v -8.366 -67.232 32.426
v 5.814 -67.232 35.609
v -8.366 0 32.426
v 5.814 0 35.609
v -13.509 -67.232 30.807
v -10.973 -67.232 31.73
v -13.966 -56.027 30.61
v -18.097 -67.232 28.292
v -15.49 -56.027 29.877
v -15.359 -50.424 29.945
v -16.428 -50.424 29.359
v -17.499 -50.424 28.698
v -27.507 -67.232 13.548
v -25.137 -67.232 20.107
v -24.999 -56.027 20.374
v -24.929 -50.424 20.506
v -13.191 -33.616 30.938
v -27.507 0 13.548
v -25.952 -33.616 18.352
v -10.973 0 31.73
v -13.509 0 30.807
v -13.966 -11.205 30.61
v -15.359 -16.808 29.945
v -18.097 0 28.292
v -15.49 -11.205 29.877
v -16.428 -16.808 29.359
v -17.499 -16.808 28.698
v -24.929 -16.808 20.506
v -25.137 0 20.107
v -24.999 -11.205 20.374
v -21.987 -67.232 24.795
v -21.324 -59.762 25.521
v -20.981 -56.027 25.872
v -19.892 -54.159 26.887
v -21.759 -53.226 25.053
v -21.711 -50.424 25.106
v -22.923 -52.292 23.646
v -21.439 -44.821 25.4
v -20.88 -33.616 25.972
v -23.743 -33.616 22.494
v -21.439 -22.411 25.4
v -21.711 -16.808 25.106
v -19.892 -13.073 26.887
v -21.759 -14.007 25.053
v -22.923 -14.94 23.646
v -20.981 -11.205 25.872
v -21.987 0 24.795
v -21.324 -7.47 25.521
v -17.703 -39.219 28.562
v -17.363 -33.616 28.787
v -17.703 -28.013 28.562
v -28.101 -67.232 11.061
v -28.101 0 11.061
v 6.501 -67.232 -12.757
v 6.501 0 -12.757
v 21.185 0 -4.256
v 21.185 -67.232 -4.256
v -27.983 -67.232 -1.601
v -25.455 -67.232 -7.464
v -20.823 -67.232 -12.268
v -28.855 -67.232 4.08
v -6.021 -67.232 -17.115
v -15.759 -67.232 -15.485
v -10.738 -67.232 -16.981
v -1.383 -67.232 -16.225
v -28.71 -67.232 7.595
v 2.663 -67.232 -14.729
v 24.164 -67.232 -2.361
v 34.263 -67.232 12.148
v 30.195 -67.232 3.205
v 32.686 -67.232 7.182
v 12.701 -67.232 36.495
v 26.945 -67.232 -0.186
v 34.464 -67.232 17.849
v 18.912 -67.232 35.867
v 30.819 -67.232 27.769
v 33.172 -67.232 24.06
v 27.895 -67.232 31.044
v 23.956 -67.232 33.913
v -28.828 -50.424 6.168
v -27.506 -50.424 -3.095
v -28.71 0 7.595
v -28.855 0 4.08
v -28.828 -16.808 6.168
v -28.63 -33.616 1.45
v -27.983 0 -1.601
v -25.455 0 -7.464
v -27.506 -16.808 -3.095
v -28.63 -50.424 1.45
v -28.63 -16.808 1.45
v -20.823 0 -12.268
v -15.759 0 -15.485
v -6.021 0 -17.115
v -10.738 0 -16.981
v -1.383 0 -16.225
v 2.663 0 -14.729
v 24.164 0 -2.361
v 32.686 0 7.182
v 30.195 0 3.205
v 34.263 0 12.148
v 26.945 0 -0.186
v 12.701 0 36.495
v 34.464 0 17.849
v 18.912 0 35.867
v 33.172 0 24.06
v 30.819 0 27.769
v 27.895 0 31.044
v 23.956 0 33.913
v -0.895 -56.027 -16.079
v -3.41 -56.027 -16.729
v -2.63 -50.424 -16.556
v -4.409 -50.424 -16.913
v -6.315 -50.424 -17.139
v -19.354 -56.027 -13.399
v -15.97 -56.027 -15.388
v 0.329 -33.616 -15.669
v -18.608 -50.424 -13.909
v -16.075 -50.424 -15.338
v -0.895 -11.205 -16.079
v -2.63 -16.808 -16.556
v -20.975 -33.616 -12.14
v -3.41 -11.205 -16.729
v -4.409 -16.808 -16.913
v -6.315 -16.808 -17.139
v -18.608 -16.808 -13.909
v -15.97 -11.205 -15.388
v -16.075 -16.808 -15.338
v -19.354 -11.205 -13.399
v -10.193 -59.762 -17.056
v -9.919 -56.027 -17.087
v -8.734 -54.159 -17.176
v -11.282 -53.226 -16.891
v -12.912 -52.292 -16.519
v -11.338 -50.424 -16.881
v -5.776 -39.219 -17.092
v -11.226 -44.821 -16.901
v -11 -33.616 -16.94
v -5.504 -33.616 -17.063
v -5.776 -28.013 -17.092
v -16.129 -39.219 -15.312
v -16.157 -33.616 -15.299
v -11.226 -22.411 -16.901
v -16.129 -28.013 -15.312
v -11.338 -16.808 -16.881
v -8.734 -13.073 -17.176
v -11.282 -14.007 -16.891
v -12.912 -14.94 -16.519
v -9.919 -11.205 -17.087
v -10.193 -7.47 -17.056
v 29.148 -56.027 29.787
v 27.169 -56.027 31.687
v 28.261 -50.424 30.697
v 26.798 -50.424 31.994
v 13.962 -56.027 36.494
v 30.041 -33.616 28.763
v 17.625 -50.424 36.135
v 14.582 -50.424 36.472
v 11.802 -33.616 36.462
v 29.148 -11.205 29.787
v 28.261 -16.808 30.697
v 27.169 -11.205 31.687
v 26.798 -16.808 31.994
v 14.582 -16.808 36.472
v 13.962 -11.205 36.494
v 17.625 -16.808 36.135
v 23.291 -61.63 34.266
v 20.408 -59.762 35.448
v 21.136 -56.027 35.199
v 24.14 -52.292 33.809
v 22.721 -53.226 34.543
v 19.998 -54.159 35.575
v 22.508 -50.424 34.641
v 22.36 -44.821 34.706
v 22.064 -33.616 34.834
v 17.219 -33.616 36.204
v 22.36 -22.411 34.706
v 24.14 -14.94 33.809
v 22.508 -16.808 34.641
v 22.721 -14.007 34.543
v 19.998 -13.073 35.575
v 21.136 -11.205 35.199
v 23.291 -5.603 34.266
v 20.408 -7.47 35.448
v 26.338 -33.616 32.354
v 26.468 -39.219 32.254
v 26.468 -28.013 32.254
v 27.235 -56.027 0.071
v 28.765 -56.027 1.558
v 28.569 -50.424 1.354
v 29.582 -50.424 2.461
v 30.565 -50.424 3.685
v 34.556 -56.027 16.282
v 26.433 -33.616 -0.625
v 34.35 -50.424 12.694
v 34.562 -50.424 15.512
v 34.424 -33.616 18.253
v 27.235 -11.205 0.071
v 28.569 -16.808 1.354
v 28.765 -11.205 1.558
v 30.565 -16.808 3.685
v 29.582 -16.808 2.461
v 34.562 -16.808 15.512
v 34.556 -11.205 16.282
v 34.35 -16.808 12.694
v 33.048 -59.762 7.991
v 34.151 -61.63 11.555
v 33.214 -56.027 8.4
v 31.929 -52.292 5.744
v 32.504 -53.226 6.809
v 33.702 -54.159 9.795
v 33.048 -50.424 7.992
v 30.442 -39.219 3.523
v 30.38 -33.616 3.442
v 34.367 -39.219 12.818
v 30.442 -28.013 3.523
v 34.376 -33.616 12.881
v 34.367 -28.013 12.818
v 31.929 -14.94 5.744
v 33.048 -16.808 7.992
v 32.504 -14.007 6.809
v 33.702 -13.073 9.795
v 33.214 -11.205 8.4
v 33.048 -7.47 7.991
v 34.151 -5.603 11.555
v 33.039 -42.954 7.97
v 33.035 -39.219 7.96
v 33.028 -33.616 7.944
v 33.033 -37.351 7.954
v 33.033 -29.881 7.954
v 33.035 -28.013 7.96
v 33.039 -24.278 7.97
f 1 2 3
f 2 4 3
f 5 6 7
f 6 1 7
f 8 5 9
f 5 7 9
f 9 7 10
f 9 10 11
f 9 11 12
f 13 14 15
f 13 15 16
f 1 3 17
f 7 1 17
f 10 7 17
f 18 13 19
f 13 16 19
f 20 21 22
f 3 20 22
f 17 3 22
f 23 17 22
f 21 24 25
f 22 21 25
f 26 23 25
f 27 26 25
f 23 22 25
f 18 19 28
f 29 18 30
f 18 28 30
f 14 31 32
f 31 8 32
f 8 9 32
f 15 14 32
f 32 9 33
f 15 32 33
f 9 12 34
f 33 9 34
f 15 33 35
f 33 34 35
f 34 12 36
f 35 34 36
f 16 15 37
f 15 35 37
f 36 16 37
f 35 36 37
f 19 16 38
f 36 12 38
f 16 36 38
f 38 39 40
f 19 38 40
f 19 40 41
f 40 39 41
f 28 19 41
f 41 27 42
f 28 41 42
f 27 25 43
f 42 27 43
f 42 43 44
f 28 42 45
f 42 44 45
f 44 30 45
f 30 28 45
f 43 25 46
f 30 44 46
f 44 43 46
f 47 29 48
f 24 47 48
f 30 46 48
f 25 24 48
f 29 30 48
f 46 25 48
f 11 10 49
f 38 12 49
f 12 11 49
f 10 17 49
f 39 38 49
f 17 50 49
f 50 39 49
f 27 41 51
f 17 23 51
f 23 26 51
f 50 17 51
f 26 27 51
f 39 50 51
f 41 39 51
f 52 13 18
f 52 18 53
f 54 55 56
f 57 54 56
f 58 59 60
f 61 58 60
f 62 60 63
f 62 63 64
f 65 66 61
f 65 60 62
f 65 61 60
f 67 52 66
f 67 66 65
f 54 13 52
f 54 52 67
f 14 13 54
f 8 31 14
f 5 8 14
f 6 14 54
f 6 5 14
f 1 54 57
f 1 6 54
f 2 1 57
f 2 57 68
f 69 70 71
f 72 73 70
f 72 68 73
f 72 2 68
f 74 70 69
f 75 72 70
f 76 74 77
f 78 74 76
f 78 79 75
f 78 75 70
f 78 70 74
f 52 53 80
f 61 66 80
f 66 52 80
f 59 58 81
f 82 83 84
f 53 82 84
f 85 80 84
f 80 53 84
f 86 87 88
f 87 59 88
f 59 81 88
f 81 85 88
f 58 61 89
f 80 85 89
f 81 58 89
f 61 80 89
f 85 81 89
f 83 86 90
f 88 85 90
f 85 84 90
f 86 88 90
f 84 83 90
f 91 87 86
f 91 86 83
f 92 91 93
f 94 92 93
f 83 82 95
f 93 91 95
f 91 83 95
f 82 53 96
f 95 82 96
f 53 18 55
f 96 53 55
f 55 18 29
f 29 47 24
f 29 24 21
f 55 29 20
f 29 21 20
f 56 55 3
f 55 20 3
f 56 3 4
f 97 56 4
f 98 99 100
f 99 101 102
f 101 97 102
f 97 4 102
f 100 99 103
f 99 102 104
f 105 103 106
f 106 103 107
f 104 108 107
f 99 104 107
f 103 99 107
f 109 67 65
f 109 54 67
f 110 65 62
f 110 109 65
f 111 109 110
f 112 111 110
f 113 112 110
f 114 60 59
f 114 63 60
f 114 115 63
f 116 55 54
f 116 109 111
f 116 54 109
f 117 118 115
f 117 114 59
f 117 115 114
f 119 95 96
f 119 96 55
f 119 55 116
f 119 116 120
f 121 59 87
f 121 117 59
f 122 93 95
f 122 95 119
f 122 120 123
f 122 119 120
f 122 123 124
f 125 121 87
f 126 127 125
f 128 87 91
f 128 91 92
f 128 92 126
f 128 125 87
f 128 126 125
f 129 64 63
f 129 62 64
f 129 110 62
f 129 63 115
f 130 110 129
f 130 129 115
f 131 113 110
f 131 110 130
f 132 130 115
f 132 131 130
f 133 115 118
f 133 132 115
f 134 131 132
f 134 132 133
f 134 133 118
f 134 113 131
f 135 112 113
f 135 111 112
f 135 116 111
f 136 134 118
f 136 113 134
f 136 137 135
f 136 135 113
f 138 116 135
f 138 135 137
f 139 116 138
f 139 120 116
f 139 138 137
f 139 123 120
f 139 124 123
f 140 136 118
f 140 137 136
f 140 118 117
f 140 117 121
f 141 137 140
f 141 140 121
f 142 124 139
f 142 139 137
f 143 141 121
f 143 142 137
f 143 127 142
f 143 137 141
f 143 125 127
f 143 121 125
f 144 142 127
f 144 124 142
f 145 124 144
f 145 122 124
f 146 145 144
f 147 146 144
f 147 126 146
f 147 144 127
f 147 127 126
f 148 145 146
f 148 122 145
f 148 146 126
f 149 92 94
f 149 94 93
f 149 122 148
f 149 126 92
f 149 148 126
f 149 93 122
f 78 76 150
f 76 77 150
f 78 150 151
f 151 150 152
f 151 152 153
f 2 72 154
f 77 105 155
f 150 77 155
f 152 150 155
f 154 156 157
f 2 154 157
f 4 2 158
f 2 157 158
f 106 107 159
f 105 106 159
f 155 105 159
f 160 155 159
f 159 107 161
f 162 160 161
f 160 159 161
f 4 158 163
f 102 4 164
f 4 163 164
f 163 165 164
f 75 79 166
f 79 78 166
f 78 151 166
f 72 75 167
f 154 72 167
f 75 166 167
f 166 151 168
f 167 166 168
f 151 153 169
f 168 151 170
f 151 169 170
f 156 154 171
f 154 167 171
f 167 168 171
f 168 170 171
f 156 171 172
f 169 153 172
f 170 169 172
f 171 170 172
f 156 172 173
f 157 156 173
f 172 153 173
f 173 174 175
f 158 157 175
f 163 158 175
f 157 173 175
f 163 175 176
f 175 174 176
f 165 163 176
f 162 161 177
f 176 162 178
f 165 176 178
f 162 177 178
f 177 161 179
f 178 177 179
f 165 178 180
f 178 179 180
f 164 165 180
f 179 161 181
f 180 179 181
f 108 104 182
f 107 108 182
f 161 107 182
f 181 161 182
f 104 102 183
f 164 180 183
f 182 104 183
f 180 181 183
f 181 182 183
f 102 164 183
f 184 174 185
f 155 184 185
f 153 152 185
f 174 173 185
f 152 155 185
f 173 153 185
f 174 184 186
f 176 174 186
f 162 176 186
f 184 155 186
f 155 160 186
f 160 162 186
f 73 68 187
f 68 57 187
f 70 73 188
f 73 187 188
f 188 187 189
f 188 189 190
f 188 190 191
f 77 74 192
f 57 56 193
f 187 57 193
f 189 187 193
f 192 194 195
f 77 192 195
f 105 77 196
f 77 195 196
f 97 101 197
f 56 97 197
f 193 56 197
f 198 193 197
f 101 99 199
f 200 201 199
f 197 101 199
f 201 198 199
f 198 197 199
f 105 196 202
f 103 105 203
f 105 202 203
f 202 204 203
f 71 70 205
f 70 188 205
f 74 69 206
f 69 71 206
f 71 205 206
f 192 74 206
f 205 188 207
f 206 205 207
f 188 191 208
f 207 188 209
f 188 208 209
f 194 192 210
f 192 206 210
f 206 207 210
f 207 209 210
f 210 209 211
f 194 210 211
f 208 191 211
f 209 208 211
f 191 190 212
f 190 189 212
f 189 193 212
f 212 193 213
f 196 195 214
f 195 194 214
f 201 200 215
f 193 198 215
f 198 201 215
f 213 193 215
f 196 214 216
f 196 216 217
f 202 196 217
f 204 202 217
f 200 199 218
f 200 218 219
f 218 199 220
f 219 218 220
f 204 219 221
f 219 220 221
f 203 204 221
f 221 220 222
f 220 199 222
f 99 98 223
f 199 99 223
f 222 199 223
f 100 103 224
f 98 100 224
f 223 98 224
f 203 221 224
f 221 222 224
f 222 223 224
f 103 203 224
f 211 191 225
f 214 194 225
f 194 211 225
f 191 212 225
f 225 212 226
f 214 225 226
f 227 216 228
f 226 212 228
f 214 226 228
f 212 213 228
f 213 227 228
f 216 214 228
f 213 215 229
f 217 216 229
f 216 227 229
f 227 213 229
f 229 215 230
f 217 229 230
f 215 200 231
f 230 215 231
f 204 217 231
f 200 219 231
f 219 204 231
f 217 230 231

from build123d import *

# Parameters (mm, degrees)
F1_DEPTH    = 67.2322362661
F2_T1_DEPTH = 173.3037820945
F2_T3_DEPTH = 146.4467100197
F2_T5_DEPTH = 179.2908953132
F2_T7_DEPTH = 184.152409541
F2_T9_DEPTH = 124.0966869943


# Not quite as in the source:
# - a fillet or chamfer that OpenCascade refuses, or shapes differently, is made with other operations: its cross-section is extruded or revolved along the edge and cut away or added


with BuildPart() as f1:
    # F0 (on Front) → F1 (new body)
    with BuildSketch(Plane.XZ):
        Polygon((-13.7368068099, -24.4724042714), (40.5815988779, 6.9719441235), (26.5129879117, 40.2553863823), (-23.8238461316, 28.9565175772), (-30.7448208332, 0), align=None)
    extrude(amount=F1_DEPTH)

    # F2: fillet of radius 25.4 on 5 edges, made by hand

    # F2_s2 → F2_t1 (cut)
    with BuildSketch(Plane.XZ.offset(-53.0357729142)):
        with BuildLine():
            add(Edge.make_bspline(
                [(34.7725342315, 20.7149972366), (26.5129879117, 40.2553863823), (5.8137329922, 35.6091234589)],
                knots=[0, 0, 0, 1, 1, 1], degree=2, weights=[1, 1, 1]))
            Line((5.8137329922, 35.6091234589), (26.5129879117, 40.2553863823))
            Line((26.5129879117, 40.2553863823), (34.7725342315, 20.7149972366))
        make_face()
    extrude(amount=F2_T1_DEPTH, mode=Mode.SUBTRACT)

    # F2_s4 → F2_t3 (cut)
    with BuildSketch(Plane.XZ.offset(-39.6072368768)):
        with BuildLine():
            add(Edge.make_bspline(
                [(-8.3655950734, 32.426357387), (-23.8238461316, 28.9565175772), (-27.5067626395, 13.5476422101)],
                knots=[0, 0, 0, 1, 1, 1], degree=2, weights=[1, 1, 1]))
            Line((-27.5067626395, 13.5476422101), (-23.8238461316, 28.9565175772))
            Line((-23.8238461316, 28.9565175772), (-8.3655950734, 32.426357387))
        make_face()
    extrude(amount=F2_T3_DEPTH, mode=Mode.SUBTRACT)

    # F2_s6 → F2_t5 (cut)
    with BuildSketch(Plane.XZ.offset(-56.0293295235)):
        with BuildLine():
            add(Edge.make_bspline(
                [(21.185409412, -4.2563040435), (40.5815988779, 6.9719441235), (31.8558498779, 27.6152729996)],
                knots=[0, 0, 0, 1, 1, 1], degree=2, weights=[1, 1, 1]))
            Line((31.8558498779, 27.6152729996), (40.5815988779, 6.9719441235))
            Line((40.5815988779, 6.9719441235), (21.185409412, -4.2563040435))
        make_face()
    extrude(amount=F2_T5_DEPTH, mode=Mode.SUBTRACT)

    # F2_s8 → F2_t7 (cut)
    with BuildSketch(Plane.XZ.offset(-58.4600866374)):
        with BuildLine():
            add(Edge.make_bspline(
                [(6.5008602522, -12.7570336572), (-13.7368068099, -24.4724042714), (-27.081995831, -5.2703469145)],
                knots=[0, 0, 0, 1, 1, 1], degree=2, weights=[1, 1, 1]))
            Line((-27.081995831, -5.2703469145), (-13.7368068099, -24.4724042714))
            Line((-13.7368068099, -24.4724042714), (6.5008602522, -12.7570336572))
        make_face()
    extrude(amount=F2_T7_DEPTH, mode=Mode.SUBTRACT)

    # F2_s10 → F2_t9 (cut)
    with BuildSketch(Plane.XZ.offset(-28.4322253641)):
        with BuildLine():
            add(Edge.make_bspline(
                [(-28.1010233758, 11.0613274641), (-30.7448208332, 0), (-24.2543511196, -9.3389738816)],
                knots=[0, 0, 0, 1, 1, 1], degree=2, weights=[1, 1, 1]))
            Line((-24.2543511196, -9.3389738816), (-30.7448208332, 0))
            Line((-30.7448208332, 0), (-28.1010233758, 11.0613274641))
        make_face()
    extrude(amount=F2_T9_DEPTH, mode=Mode.SUBTRACT)


solid = f1.part
